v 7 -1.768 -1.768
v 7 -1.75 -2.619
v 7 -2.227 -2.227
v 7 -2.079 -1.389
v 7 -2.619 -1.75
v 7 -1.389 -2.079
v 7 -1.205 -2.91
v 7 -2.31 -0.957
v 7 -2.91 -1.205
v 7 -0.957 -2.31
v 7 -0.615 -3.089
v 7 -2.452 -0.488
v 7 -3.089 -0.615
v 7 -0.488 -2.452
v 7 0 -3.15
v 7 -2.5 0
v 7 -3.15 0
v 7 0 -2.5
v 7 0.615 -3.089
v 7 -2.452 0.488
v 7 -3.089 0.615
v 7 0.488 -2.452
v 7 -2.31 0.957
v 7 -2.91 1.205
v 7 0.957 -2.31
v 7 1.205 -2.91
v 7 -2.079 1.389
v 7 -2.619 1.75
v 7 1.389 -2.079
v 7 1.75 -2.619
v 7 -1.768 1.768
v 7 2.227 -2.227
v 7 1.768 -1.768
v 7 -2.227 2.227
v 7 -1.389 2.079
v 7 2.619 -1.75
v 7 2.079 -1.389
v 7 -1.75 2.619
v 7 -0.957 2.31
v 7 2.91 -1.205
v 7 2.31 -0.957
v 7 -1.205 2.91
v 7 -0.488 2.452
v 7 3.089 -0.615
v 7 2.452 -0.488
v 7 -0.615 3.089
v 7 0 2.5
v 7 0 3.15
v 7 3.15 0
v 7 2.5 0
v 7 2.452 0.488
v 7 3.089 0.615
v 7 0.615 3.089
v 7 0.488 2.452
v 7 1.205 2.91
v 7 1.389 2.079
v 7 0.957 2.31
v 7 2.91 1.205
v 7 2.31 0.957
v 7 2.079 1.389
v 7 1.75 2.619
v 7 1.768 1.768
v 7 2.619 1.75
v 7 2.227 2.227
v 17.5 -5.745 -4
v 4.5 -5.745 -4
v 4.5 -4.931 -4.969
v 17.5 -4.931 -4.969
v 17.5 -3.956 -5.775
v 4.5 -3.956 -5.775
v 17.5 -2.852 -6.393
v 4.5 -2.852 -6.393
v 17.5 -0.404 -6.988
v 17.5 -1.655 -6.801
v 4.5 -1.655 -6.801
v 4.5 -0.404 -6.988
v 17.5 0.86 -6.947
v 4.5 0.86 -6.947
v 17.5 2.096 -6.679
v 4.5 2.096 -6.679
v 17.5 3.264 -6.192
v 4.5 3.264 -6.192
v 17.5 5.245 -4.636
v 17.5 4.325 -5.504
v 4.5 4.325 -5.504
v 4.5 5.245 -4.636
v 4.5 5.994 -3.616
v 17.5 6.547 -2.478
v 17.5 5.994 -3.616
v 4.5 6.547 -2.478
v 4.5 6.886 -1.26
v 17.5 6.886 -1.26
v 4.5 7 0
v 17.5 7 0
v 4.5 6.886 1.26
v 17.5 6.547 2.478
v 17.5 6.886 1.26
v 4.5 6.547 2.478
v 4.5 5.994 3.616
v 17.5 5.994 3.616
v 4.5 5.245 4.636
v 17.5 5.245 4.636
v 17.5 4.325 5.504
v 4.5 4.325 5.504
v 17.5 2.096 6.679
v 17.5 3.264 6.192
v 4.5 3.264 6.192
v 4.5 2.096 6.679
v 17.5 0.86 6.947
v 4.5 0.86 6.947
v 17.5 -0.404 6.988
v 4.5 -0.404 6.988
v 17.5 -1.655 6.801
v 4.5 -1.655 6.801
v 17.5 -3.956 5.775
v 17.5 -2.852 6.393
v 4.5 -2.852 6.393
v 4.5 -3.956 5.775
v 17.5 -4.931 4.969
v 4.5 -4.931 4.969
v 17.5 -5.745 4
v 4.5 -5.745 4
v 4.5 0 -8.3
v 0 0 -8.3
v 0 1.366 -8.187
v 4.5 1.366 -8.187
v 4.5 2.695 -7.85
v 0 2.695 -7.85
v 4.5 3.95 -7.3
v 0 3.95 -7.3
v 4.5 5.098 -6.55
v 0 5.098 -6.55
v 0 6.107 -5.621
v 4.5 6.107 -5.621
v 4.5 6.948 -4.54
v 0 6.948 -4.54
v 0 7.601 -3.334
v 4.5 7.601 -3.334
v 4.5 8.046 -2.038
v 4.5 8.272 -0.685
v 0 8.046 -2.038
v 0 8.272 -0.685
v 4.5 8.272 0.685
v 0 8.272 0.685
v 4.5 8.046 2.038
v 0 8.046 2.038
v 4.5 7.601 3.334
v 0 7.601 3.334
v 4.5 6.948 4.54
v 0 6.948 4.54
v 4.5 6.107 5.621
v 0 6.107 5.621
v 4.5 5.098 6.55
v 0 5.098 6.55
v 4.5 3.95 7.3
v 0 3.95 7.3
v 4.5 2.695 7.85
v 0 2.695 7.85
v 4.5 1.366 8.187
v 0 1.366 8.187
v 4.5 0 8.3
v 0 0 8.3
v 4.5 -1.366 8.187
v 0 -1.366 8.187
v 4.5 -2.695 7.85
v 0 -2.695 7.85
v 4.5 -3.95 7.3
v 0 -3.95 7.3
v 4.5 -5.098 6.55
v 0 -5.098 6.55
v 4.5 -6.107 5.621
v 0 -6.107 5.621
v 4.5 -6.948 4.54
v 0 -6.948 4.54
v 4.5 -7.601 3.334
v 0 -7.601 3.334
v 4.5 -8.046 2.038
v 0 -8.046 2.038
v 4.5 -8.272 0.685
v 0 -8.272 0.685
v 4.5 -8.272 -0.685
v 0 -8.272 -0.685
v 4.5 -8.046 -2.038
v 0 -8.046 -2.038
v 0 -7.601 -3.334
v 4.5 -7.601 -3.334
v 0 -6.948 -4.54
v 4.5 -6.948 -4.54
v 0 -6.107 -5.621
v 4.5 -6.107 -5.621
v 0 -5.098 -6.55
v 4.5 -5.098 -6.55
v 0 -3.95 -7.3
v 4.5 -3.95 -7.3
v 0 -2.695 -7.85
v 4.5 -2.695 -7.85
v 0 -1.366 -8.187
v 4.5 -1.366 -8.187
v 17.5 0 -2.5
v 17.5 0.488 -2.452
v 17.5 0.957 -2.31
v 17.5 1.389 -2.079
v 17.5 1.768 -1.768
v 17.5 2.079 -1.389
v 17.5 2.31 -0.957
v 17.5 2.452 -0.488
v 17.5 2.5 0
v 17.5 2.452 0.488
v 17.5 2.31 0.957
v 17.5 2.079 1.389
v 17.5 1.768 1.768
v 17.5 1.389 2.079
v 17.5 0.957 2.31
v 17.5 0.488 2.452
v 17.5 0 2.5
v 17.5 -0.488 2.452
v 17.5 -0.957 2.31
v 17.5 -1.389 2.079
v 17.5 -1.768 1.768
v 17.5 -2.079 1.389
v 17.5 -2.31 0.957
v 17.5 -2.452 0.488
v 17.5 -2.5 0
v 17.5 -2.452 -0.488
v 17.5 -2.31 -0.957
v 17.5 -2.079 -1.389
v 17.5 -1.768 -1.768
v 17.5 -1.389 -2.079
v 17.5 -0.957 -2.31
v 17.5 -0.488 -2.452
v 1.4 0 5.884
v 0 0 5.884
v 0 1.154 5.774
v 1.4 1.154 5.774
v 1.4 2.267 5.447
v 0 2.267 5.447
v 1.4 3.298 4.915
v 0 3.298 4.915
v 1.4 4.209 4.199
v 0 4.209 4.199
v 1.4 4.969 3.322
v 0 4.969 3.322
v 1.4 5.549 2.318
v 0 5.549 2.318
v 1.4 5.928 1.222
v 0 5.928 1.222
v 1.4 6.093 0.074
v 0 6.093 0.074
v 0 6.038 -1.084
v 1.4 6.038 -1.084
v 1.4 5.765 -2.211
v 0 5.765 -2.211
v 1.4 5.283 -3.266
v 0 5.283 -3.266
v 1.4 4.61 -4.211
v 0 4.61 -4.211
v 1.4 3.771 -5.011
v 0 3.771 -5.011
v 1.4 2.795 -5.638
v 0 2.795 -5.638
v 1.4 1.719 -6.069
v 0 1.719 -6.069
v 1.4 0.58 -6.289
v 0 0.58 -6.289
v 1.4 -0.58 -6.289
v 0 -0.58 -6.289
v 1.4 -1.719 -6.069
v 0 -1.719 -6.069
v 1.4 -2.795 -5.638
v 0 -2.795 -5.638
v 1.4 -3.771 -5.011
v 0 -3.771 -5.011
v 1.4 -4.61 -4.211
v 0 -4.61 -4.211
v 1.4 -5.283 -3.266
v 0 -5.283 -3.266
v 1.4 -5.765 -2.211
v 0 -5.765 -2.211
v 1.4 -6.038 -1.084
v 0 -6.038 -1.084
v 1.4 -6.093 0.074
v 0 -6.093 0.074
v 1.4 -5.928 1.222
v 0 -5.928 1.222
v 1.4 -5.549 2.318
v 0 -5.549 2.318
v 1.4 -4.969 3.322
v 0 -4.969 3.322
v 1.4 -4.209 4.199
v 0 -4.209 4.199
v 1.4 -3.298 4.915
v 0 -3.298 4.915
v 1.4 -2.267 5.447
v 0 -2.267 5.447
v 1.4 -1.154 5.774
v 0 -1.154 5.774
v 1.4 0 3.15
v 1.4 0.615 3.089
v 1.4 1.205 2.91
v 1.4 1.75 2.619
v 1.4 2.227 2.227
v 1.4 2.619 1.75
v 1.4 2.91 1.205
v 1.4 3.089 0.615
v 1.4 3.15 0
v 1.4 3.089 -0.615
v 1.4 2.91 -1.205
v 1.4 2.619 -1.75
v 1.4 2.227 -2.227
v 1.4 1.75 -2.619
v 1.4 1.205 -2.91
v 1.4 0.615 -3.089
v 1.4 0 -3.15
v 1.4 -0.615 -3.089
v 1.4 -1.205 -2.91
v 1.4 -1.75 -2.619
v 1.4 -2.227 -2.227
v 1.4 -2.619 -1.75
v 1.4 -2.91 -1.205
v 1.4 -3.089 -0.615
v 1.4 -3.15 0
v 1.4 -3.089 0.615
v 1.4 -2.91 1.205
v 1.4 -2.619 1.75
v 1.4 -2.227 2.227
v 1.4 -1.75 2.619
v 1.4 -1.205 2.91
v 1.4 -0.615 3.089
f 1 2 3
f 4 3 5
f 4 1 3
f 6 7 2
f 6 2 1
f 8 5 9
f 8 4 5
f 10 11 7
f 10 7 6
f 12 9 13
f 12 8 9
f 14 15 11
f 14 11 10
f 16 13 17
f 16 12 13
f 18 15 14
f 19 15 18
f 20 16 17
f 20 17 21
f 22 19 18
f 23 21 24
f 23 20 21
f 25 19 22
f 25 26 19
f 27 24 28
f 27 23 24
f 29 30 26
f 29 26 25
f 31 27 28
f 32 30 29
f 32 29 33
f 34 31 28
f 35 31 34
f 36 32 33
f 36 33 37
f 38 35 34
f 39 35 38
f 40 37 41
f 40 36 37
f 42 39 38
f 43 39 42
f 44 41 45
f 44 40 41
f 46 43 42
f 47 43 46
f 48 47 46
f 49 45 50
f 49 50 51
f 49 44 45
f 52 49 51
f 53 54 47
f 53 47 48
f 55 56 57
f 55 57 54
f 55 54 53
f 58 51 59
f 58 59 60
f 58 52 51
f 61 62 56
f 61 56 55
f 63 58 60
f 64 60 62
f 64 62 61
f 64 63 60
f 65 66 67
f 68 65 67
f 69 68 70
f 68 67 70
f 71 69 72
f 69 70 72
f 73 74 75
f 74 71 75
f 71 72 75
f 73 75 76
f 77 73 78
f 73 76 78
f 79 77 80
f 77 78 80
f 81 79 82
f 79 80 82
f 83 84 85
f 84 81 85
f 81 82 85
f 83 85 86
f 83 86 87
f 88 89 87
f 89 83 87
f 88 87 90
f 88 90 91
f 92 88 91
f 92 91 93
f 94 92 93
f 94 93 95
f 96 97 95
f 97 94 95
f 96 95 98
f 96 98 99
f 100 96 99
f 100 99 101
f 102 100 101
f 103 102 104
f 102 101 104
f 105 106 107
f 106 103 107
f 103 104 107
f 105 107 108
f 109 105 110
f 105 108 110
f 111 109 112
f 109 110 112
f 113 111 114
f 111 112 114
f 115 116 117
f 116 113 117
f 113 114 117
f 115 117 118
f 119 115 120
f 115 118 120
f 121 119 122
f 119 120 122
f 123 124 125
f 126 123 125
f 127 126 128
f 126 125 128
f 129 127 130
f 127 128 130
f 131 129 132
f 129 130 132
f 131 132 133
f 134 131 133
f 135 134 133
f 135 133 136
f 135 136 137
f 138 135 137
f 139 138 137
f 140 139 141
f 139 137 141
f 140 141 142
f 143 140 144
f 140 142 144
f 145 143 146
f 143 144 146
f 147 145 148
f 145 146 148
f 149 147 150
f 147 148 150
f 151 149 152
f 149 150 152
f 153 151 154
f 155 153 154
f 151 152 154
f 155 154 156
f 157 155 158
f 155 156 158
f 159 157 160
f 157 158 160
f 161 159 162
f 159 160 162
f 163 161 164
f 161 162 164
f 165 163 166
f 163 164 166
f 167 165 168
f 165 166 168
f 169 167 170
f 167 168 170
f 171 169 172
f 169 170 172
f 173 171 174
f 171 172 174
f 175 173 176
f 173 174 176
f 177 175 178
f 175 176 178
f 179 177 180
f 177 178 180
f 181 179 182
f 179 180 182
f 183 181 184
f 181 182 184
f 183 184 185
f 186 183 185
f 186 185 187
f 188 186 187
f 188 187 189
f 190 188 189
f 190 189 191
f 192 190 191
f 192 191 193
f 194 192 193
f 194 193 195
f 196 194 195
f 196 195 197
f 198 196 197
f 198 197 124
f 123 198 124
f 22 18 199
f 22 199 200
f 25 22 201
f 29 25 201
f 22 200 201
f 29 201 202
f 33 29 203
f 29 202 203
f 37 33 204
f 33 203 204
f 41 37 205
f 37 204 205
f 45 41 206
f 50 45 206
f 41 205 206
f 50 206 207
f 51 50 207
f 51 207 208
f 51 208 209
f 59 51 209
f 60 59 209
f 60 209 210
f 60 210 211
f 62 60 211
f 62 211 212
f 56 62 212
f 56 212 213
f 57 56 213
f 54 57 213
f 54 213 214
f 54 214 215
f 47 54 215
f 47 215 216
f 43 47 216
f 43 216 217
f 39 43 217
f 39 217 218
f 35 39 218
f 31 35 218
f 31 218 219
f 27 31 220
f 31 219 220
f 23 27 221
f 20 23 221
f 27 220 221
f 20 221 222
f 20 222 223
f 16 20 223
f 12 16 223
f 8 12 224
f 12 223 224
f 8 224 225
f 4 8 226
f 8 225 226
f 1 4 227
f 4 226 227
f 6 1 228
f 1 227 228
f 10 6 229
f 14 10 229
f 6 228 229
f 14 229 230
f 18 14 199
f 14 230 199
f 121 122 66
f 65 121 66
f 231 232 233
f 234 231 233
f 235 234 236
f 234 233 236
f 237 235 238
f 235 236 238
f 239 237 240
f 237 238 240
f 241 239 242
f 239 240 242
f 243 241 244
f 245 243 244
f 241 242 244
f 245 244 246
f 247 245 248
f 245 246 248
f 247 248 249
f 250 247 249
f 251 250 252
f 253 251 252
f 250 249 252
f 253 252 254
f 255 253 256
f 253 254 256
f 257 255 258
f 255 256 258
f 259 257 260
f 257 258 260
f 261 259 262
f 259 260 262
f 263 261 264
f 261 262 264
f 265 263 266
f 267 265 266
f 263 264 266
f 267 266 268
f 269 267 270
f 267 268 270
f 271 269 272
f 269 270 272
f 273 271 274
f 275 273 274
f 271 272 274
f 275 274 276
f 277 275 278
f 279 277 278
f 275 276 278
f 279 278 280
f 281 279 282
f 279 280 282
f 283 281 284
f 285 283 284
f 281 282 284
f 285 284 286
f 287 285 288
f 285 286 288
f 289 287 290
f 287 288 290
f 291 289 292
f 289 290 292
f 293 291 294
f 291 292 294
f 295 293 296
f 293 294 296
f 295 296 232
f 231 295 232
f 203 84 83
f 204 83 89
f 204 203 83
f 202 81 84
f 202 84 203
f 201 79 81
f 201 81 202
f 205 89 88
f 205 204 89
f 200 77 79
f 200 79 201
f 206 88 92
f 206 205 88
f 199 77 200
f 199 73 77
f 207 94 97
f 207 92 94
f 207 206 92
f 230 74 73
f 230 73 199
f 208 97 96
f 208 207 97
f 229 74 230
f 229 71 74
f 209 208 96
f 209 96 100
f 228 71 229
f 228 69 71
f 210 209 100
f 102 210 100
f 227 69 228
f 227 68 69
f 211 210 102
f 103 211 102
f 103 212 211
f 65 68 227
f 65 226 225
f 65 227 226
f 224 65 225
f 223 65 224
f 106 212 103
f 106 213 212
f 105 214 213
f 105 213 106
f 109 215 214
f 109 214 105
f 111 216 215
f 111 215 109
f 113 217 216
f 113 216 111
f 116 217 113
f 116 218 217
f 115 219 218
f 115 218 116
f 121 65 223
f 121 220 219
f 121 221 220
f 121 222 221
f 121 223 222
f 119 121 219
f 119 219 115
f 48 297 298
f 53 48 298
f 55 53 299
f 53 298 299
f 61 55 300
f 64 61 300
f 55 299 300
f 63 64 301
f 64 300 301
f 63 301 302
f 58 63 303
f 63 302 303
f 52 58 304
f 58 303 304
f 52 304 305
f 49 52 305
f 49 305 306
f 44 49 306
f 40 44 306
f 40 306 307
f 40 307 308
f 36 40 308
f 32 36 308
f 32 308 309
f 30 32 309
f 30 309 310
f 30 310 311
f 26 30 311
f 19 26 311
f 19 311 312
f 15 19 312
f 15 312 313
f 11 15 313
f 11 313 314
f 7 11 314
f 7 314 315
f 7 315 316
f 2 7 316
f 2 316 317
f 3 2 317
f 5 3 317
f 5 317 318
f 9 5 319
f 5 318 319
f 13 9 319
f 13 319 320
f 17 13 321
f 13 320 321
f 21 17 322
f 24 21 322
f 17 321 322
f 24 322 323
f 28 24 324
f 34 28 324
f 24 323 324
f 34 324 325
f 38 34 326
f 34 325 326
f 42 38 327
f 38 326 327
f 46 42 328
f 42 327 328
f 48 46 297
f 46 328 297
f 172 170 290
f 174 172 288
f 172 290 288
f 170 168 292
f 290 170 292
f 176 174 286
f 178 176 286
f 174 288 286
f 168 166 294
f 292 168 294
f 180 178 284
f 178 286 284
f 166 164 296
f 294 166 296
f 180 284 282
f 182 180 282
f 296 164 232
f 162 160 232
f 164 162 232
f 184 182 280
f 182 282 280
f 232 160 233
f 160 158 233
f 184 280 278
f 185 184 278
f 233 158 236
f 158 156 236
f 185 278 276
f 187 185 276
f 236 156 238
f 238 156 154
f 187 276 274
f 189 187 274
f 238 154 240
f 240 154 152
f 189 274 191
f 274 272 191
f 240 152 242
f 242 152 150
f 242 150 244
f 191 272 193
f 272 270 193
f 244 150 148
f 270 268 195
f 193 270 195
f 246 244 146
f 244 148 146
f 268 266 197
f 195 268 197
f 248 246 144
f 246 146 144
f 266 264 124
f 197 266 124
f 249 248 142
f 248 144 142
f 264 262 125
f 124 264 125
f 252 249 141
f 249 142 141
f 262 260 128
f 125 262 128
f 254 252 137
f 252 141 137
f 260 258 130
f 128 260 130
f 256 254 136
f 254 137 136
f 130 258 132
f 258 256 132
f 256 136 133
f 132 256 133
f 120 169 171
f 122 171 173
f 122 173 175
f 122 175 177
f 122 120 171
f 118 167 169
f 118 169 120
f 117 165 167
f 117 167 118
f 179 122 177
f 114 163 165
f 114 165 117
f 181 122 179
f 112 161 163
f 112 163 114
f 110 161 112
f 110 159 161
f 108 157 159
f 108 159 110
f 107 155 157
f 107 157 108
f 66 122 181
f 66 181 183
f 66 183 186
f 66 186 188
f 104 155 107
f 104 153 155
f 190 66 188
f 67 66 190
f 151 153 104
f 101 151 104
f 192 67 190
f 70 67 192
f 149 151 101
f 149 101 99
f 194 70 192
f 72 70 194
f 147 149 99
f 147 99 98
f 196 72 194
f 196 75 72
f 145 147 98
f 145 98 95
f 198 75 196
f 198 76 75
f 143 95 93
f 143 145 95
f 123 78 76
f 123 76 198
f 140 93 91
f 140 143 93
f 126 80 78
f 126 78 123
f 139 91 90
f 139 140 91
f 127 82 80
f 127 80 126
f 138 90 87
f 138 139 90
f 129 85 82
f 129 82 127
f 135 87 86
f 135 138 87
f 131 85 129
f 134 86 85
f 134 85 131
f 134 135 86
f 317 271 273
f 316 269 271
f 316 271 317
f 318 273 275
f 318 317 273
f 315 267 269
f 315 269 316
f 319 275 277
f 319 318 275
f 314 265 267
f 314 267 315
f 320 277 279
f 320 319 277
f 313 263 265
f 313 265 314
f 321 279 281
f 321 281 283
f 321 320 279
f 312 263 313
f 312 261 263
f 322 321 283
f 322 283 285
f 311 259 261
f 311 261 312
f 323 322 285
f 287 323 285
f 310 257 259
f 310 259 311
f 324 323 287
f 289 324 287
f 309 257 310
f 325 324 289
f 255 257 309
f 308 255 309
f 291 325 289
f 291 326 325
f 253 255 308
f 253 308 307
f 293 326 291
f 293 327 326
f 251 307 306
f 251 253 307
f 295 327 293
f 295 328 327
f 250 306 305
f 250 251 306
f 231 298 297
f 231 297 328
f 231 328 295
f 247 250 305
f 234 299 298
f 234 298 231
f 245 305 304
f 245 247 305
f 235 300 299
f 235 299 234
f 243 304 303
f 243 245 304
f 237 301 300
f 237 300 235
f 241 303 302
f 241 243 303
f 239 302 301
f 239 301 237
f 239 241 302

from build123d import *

# Parameters (mm, degrees)
SKETCH_1_R          = 8.3
EXTRUDE_1_DEPTH     = 4.5
SKETCH_2_R          = 6.1
CUT_EXTRUDE_1_DEPTH = 1.4
SKETCH_3_R          = 7
EXTRUDE_4_DEPTH     = 13
SKETCH_9_R          = 2.5
CUT_EXTRUDE_7_DEPTH = 22.072019362
CUT_EXTRUDE_START   = -13
CUT_EXTRUDE_8_DEPTH = 13
SKETCH_12_R         = 3.15
CUT_EXTRUDE_9_DEPTH = 7


with BuildPart() as part:
    # Эскиз1 → Бобышка-Вытянуть1 (new body)
    with BuildSketch(Plane(origin=(0, 0, 0), x_dir=(0, 0, -1), z_dir=(1, 0, 0))):
        Circle(SKETCH_1_R)
    extrude(amount=EXTRUDE_1_DEPTH)

    # Эскиз2 → Вырез-Вытянуть1 (cut)
    with BuildSketch(Plane.ZY):
        with Locations((-0.21618585, 0)):
            Circle(SKETCH_2_R)
    extrude(amount=-CUT_EXTRUDE_1_DEPTH, mode=Mode.SUBTRACT)

    # Эскиз3 → Бобышка-Вытянуть4 (add)
    with BuildSketch(Plane(origin=(4.5, 0, 0), x_dir=(0, 0, -1), z_dir=(1, 0, 0))):
        with Locations(Location((0, 0, 0), (0, 0, 180))):
            Circle(SKETCH_3_R)
    extrude(amount=EXTRUDE_4_DEPTH)

    # Эскиз9 → Вырез-Вытянуть7 (cut, through all)
    with BuildSketch(Plane(origin=(17.5, 0, 0), x_dir=(0, 0, -1), z_dir=(1, 0, 0))):
        Circle(SKETCH_9_R)
    extrude(amount=-CUT_EXTRUDE_7_DEPTH, mode=Mode.SUBTRACT)

    # Эскиз10 → Вырез-Вытянуть8 (cut)
    with BuildSketch(Plane(origin=(17.5, 0, 0), x_dir=(0, 0, -1), z_dir=(1, 0, 0)).offset(CUT_EXTRUDE_START)):
        with BuildLine():
            Line((-4, -5.744562647), (4, -5.744562647))
            ThreePointArc((4, -5.744562647), (0, -7), (-4, -5.744562647))
        make_face()
    extrude(amount=CUT_EXTRUDE_8_DEPTH, mode=Mode.SUBTRACT)

    # Эскиз12 → Вырез-Вытянуть9 (cut)
    with BuildSketch(Plane.ZY):
        Circle(SKETCH_12_R)
    extrude(amount=-CUT_EXTRUDE_9_DEPTH, mode=Mode.SUBTRACT)


solid = part.part
